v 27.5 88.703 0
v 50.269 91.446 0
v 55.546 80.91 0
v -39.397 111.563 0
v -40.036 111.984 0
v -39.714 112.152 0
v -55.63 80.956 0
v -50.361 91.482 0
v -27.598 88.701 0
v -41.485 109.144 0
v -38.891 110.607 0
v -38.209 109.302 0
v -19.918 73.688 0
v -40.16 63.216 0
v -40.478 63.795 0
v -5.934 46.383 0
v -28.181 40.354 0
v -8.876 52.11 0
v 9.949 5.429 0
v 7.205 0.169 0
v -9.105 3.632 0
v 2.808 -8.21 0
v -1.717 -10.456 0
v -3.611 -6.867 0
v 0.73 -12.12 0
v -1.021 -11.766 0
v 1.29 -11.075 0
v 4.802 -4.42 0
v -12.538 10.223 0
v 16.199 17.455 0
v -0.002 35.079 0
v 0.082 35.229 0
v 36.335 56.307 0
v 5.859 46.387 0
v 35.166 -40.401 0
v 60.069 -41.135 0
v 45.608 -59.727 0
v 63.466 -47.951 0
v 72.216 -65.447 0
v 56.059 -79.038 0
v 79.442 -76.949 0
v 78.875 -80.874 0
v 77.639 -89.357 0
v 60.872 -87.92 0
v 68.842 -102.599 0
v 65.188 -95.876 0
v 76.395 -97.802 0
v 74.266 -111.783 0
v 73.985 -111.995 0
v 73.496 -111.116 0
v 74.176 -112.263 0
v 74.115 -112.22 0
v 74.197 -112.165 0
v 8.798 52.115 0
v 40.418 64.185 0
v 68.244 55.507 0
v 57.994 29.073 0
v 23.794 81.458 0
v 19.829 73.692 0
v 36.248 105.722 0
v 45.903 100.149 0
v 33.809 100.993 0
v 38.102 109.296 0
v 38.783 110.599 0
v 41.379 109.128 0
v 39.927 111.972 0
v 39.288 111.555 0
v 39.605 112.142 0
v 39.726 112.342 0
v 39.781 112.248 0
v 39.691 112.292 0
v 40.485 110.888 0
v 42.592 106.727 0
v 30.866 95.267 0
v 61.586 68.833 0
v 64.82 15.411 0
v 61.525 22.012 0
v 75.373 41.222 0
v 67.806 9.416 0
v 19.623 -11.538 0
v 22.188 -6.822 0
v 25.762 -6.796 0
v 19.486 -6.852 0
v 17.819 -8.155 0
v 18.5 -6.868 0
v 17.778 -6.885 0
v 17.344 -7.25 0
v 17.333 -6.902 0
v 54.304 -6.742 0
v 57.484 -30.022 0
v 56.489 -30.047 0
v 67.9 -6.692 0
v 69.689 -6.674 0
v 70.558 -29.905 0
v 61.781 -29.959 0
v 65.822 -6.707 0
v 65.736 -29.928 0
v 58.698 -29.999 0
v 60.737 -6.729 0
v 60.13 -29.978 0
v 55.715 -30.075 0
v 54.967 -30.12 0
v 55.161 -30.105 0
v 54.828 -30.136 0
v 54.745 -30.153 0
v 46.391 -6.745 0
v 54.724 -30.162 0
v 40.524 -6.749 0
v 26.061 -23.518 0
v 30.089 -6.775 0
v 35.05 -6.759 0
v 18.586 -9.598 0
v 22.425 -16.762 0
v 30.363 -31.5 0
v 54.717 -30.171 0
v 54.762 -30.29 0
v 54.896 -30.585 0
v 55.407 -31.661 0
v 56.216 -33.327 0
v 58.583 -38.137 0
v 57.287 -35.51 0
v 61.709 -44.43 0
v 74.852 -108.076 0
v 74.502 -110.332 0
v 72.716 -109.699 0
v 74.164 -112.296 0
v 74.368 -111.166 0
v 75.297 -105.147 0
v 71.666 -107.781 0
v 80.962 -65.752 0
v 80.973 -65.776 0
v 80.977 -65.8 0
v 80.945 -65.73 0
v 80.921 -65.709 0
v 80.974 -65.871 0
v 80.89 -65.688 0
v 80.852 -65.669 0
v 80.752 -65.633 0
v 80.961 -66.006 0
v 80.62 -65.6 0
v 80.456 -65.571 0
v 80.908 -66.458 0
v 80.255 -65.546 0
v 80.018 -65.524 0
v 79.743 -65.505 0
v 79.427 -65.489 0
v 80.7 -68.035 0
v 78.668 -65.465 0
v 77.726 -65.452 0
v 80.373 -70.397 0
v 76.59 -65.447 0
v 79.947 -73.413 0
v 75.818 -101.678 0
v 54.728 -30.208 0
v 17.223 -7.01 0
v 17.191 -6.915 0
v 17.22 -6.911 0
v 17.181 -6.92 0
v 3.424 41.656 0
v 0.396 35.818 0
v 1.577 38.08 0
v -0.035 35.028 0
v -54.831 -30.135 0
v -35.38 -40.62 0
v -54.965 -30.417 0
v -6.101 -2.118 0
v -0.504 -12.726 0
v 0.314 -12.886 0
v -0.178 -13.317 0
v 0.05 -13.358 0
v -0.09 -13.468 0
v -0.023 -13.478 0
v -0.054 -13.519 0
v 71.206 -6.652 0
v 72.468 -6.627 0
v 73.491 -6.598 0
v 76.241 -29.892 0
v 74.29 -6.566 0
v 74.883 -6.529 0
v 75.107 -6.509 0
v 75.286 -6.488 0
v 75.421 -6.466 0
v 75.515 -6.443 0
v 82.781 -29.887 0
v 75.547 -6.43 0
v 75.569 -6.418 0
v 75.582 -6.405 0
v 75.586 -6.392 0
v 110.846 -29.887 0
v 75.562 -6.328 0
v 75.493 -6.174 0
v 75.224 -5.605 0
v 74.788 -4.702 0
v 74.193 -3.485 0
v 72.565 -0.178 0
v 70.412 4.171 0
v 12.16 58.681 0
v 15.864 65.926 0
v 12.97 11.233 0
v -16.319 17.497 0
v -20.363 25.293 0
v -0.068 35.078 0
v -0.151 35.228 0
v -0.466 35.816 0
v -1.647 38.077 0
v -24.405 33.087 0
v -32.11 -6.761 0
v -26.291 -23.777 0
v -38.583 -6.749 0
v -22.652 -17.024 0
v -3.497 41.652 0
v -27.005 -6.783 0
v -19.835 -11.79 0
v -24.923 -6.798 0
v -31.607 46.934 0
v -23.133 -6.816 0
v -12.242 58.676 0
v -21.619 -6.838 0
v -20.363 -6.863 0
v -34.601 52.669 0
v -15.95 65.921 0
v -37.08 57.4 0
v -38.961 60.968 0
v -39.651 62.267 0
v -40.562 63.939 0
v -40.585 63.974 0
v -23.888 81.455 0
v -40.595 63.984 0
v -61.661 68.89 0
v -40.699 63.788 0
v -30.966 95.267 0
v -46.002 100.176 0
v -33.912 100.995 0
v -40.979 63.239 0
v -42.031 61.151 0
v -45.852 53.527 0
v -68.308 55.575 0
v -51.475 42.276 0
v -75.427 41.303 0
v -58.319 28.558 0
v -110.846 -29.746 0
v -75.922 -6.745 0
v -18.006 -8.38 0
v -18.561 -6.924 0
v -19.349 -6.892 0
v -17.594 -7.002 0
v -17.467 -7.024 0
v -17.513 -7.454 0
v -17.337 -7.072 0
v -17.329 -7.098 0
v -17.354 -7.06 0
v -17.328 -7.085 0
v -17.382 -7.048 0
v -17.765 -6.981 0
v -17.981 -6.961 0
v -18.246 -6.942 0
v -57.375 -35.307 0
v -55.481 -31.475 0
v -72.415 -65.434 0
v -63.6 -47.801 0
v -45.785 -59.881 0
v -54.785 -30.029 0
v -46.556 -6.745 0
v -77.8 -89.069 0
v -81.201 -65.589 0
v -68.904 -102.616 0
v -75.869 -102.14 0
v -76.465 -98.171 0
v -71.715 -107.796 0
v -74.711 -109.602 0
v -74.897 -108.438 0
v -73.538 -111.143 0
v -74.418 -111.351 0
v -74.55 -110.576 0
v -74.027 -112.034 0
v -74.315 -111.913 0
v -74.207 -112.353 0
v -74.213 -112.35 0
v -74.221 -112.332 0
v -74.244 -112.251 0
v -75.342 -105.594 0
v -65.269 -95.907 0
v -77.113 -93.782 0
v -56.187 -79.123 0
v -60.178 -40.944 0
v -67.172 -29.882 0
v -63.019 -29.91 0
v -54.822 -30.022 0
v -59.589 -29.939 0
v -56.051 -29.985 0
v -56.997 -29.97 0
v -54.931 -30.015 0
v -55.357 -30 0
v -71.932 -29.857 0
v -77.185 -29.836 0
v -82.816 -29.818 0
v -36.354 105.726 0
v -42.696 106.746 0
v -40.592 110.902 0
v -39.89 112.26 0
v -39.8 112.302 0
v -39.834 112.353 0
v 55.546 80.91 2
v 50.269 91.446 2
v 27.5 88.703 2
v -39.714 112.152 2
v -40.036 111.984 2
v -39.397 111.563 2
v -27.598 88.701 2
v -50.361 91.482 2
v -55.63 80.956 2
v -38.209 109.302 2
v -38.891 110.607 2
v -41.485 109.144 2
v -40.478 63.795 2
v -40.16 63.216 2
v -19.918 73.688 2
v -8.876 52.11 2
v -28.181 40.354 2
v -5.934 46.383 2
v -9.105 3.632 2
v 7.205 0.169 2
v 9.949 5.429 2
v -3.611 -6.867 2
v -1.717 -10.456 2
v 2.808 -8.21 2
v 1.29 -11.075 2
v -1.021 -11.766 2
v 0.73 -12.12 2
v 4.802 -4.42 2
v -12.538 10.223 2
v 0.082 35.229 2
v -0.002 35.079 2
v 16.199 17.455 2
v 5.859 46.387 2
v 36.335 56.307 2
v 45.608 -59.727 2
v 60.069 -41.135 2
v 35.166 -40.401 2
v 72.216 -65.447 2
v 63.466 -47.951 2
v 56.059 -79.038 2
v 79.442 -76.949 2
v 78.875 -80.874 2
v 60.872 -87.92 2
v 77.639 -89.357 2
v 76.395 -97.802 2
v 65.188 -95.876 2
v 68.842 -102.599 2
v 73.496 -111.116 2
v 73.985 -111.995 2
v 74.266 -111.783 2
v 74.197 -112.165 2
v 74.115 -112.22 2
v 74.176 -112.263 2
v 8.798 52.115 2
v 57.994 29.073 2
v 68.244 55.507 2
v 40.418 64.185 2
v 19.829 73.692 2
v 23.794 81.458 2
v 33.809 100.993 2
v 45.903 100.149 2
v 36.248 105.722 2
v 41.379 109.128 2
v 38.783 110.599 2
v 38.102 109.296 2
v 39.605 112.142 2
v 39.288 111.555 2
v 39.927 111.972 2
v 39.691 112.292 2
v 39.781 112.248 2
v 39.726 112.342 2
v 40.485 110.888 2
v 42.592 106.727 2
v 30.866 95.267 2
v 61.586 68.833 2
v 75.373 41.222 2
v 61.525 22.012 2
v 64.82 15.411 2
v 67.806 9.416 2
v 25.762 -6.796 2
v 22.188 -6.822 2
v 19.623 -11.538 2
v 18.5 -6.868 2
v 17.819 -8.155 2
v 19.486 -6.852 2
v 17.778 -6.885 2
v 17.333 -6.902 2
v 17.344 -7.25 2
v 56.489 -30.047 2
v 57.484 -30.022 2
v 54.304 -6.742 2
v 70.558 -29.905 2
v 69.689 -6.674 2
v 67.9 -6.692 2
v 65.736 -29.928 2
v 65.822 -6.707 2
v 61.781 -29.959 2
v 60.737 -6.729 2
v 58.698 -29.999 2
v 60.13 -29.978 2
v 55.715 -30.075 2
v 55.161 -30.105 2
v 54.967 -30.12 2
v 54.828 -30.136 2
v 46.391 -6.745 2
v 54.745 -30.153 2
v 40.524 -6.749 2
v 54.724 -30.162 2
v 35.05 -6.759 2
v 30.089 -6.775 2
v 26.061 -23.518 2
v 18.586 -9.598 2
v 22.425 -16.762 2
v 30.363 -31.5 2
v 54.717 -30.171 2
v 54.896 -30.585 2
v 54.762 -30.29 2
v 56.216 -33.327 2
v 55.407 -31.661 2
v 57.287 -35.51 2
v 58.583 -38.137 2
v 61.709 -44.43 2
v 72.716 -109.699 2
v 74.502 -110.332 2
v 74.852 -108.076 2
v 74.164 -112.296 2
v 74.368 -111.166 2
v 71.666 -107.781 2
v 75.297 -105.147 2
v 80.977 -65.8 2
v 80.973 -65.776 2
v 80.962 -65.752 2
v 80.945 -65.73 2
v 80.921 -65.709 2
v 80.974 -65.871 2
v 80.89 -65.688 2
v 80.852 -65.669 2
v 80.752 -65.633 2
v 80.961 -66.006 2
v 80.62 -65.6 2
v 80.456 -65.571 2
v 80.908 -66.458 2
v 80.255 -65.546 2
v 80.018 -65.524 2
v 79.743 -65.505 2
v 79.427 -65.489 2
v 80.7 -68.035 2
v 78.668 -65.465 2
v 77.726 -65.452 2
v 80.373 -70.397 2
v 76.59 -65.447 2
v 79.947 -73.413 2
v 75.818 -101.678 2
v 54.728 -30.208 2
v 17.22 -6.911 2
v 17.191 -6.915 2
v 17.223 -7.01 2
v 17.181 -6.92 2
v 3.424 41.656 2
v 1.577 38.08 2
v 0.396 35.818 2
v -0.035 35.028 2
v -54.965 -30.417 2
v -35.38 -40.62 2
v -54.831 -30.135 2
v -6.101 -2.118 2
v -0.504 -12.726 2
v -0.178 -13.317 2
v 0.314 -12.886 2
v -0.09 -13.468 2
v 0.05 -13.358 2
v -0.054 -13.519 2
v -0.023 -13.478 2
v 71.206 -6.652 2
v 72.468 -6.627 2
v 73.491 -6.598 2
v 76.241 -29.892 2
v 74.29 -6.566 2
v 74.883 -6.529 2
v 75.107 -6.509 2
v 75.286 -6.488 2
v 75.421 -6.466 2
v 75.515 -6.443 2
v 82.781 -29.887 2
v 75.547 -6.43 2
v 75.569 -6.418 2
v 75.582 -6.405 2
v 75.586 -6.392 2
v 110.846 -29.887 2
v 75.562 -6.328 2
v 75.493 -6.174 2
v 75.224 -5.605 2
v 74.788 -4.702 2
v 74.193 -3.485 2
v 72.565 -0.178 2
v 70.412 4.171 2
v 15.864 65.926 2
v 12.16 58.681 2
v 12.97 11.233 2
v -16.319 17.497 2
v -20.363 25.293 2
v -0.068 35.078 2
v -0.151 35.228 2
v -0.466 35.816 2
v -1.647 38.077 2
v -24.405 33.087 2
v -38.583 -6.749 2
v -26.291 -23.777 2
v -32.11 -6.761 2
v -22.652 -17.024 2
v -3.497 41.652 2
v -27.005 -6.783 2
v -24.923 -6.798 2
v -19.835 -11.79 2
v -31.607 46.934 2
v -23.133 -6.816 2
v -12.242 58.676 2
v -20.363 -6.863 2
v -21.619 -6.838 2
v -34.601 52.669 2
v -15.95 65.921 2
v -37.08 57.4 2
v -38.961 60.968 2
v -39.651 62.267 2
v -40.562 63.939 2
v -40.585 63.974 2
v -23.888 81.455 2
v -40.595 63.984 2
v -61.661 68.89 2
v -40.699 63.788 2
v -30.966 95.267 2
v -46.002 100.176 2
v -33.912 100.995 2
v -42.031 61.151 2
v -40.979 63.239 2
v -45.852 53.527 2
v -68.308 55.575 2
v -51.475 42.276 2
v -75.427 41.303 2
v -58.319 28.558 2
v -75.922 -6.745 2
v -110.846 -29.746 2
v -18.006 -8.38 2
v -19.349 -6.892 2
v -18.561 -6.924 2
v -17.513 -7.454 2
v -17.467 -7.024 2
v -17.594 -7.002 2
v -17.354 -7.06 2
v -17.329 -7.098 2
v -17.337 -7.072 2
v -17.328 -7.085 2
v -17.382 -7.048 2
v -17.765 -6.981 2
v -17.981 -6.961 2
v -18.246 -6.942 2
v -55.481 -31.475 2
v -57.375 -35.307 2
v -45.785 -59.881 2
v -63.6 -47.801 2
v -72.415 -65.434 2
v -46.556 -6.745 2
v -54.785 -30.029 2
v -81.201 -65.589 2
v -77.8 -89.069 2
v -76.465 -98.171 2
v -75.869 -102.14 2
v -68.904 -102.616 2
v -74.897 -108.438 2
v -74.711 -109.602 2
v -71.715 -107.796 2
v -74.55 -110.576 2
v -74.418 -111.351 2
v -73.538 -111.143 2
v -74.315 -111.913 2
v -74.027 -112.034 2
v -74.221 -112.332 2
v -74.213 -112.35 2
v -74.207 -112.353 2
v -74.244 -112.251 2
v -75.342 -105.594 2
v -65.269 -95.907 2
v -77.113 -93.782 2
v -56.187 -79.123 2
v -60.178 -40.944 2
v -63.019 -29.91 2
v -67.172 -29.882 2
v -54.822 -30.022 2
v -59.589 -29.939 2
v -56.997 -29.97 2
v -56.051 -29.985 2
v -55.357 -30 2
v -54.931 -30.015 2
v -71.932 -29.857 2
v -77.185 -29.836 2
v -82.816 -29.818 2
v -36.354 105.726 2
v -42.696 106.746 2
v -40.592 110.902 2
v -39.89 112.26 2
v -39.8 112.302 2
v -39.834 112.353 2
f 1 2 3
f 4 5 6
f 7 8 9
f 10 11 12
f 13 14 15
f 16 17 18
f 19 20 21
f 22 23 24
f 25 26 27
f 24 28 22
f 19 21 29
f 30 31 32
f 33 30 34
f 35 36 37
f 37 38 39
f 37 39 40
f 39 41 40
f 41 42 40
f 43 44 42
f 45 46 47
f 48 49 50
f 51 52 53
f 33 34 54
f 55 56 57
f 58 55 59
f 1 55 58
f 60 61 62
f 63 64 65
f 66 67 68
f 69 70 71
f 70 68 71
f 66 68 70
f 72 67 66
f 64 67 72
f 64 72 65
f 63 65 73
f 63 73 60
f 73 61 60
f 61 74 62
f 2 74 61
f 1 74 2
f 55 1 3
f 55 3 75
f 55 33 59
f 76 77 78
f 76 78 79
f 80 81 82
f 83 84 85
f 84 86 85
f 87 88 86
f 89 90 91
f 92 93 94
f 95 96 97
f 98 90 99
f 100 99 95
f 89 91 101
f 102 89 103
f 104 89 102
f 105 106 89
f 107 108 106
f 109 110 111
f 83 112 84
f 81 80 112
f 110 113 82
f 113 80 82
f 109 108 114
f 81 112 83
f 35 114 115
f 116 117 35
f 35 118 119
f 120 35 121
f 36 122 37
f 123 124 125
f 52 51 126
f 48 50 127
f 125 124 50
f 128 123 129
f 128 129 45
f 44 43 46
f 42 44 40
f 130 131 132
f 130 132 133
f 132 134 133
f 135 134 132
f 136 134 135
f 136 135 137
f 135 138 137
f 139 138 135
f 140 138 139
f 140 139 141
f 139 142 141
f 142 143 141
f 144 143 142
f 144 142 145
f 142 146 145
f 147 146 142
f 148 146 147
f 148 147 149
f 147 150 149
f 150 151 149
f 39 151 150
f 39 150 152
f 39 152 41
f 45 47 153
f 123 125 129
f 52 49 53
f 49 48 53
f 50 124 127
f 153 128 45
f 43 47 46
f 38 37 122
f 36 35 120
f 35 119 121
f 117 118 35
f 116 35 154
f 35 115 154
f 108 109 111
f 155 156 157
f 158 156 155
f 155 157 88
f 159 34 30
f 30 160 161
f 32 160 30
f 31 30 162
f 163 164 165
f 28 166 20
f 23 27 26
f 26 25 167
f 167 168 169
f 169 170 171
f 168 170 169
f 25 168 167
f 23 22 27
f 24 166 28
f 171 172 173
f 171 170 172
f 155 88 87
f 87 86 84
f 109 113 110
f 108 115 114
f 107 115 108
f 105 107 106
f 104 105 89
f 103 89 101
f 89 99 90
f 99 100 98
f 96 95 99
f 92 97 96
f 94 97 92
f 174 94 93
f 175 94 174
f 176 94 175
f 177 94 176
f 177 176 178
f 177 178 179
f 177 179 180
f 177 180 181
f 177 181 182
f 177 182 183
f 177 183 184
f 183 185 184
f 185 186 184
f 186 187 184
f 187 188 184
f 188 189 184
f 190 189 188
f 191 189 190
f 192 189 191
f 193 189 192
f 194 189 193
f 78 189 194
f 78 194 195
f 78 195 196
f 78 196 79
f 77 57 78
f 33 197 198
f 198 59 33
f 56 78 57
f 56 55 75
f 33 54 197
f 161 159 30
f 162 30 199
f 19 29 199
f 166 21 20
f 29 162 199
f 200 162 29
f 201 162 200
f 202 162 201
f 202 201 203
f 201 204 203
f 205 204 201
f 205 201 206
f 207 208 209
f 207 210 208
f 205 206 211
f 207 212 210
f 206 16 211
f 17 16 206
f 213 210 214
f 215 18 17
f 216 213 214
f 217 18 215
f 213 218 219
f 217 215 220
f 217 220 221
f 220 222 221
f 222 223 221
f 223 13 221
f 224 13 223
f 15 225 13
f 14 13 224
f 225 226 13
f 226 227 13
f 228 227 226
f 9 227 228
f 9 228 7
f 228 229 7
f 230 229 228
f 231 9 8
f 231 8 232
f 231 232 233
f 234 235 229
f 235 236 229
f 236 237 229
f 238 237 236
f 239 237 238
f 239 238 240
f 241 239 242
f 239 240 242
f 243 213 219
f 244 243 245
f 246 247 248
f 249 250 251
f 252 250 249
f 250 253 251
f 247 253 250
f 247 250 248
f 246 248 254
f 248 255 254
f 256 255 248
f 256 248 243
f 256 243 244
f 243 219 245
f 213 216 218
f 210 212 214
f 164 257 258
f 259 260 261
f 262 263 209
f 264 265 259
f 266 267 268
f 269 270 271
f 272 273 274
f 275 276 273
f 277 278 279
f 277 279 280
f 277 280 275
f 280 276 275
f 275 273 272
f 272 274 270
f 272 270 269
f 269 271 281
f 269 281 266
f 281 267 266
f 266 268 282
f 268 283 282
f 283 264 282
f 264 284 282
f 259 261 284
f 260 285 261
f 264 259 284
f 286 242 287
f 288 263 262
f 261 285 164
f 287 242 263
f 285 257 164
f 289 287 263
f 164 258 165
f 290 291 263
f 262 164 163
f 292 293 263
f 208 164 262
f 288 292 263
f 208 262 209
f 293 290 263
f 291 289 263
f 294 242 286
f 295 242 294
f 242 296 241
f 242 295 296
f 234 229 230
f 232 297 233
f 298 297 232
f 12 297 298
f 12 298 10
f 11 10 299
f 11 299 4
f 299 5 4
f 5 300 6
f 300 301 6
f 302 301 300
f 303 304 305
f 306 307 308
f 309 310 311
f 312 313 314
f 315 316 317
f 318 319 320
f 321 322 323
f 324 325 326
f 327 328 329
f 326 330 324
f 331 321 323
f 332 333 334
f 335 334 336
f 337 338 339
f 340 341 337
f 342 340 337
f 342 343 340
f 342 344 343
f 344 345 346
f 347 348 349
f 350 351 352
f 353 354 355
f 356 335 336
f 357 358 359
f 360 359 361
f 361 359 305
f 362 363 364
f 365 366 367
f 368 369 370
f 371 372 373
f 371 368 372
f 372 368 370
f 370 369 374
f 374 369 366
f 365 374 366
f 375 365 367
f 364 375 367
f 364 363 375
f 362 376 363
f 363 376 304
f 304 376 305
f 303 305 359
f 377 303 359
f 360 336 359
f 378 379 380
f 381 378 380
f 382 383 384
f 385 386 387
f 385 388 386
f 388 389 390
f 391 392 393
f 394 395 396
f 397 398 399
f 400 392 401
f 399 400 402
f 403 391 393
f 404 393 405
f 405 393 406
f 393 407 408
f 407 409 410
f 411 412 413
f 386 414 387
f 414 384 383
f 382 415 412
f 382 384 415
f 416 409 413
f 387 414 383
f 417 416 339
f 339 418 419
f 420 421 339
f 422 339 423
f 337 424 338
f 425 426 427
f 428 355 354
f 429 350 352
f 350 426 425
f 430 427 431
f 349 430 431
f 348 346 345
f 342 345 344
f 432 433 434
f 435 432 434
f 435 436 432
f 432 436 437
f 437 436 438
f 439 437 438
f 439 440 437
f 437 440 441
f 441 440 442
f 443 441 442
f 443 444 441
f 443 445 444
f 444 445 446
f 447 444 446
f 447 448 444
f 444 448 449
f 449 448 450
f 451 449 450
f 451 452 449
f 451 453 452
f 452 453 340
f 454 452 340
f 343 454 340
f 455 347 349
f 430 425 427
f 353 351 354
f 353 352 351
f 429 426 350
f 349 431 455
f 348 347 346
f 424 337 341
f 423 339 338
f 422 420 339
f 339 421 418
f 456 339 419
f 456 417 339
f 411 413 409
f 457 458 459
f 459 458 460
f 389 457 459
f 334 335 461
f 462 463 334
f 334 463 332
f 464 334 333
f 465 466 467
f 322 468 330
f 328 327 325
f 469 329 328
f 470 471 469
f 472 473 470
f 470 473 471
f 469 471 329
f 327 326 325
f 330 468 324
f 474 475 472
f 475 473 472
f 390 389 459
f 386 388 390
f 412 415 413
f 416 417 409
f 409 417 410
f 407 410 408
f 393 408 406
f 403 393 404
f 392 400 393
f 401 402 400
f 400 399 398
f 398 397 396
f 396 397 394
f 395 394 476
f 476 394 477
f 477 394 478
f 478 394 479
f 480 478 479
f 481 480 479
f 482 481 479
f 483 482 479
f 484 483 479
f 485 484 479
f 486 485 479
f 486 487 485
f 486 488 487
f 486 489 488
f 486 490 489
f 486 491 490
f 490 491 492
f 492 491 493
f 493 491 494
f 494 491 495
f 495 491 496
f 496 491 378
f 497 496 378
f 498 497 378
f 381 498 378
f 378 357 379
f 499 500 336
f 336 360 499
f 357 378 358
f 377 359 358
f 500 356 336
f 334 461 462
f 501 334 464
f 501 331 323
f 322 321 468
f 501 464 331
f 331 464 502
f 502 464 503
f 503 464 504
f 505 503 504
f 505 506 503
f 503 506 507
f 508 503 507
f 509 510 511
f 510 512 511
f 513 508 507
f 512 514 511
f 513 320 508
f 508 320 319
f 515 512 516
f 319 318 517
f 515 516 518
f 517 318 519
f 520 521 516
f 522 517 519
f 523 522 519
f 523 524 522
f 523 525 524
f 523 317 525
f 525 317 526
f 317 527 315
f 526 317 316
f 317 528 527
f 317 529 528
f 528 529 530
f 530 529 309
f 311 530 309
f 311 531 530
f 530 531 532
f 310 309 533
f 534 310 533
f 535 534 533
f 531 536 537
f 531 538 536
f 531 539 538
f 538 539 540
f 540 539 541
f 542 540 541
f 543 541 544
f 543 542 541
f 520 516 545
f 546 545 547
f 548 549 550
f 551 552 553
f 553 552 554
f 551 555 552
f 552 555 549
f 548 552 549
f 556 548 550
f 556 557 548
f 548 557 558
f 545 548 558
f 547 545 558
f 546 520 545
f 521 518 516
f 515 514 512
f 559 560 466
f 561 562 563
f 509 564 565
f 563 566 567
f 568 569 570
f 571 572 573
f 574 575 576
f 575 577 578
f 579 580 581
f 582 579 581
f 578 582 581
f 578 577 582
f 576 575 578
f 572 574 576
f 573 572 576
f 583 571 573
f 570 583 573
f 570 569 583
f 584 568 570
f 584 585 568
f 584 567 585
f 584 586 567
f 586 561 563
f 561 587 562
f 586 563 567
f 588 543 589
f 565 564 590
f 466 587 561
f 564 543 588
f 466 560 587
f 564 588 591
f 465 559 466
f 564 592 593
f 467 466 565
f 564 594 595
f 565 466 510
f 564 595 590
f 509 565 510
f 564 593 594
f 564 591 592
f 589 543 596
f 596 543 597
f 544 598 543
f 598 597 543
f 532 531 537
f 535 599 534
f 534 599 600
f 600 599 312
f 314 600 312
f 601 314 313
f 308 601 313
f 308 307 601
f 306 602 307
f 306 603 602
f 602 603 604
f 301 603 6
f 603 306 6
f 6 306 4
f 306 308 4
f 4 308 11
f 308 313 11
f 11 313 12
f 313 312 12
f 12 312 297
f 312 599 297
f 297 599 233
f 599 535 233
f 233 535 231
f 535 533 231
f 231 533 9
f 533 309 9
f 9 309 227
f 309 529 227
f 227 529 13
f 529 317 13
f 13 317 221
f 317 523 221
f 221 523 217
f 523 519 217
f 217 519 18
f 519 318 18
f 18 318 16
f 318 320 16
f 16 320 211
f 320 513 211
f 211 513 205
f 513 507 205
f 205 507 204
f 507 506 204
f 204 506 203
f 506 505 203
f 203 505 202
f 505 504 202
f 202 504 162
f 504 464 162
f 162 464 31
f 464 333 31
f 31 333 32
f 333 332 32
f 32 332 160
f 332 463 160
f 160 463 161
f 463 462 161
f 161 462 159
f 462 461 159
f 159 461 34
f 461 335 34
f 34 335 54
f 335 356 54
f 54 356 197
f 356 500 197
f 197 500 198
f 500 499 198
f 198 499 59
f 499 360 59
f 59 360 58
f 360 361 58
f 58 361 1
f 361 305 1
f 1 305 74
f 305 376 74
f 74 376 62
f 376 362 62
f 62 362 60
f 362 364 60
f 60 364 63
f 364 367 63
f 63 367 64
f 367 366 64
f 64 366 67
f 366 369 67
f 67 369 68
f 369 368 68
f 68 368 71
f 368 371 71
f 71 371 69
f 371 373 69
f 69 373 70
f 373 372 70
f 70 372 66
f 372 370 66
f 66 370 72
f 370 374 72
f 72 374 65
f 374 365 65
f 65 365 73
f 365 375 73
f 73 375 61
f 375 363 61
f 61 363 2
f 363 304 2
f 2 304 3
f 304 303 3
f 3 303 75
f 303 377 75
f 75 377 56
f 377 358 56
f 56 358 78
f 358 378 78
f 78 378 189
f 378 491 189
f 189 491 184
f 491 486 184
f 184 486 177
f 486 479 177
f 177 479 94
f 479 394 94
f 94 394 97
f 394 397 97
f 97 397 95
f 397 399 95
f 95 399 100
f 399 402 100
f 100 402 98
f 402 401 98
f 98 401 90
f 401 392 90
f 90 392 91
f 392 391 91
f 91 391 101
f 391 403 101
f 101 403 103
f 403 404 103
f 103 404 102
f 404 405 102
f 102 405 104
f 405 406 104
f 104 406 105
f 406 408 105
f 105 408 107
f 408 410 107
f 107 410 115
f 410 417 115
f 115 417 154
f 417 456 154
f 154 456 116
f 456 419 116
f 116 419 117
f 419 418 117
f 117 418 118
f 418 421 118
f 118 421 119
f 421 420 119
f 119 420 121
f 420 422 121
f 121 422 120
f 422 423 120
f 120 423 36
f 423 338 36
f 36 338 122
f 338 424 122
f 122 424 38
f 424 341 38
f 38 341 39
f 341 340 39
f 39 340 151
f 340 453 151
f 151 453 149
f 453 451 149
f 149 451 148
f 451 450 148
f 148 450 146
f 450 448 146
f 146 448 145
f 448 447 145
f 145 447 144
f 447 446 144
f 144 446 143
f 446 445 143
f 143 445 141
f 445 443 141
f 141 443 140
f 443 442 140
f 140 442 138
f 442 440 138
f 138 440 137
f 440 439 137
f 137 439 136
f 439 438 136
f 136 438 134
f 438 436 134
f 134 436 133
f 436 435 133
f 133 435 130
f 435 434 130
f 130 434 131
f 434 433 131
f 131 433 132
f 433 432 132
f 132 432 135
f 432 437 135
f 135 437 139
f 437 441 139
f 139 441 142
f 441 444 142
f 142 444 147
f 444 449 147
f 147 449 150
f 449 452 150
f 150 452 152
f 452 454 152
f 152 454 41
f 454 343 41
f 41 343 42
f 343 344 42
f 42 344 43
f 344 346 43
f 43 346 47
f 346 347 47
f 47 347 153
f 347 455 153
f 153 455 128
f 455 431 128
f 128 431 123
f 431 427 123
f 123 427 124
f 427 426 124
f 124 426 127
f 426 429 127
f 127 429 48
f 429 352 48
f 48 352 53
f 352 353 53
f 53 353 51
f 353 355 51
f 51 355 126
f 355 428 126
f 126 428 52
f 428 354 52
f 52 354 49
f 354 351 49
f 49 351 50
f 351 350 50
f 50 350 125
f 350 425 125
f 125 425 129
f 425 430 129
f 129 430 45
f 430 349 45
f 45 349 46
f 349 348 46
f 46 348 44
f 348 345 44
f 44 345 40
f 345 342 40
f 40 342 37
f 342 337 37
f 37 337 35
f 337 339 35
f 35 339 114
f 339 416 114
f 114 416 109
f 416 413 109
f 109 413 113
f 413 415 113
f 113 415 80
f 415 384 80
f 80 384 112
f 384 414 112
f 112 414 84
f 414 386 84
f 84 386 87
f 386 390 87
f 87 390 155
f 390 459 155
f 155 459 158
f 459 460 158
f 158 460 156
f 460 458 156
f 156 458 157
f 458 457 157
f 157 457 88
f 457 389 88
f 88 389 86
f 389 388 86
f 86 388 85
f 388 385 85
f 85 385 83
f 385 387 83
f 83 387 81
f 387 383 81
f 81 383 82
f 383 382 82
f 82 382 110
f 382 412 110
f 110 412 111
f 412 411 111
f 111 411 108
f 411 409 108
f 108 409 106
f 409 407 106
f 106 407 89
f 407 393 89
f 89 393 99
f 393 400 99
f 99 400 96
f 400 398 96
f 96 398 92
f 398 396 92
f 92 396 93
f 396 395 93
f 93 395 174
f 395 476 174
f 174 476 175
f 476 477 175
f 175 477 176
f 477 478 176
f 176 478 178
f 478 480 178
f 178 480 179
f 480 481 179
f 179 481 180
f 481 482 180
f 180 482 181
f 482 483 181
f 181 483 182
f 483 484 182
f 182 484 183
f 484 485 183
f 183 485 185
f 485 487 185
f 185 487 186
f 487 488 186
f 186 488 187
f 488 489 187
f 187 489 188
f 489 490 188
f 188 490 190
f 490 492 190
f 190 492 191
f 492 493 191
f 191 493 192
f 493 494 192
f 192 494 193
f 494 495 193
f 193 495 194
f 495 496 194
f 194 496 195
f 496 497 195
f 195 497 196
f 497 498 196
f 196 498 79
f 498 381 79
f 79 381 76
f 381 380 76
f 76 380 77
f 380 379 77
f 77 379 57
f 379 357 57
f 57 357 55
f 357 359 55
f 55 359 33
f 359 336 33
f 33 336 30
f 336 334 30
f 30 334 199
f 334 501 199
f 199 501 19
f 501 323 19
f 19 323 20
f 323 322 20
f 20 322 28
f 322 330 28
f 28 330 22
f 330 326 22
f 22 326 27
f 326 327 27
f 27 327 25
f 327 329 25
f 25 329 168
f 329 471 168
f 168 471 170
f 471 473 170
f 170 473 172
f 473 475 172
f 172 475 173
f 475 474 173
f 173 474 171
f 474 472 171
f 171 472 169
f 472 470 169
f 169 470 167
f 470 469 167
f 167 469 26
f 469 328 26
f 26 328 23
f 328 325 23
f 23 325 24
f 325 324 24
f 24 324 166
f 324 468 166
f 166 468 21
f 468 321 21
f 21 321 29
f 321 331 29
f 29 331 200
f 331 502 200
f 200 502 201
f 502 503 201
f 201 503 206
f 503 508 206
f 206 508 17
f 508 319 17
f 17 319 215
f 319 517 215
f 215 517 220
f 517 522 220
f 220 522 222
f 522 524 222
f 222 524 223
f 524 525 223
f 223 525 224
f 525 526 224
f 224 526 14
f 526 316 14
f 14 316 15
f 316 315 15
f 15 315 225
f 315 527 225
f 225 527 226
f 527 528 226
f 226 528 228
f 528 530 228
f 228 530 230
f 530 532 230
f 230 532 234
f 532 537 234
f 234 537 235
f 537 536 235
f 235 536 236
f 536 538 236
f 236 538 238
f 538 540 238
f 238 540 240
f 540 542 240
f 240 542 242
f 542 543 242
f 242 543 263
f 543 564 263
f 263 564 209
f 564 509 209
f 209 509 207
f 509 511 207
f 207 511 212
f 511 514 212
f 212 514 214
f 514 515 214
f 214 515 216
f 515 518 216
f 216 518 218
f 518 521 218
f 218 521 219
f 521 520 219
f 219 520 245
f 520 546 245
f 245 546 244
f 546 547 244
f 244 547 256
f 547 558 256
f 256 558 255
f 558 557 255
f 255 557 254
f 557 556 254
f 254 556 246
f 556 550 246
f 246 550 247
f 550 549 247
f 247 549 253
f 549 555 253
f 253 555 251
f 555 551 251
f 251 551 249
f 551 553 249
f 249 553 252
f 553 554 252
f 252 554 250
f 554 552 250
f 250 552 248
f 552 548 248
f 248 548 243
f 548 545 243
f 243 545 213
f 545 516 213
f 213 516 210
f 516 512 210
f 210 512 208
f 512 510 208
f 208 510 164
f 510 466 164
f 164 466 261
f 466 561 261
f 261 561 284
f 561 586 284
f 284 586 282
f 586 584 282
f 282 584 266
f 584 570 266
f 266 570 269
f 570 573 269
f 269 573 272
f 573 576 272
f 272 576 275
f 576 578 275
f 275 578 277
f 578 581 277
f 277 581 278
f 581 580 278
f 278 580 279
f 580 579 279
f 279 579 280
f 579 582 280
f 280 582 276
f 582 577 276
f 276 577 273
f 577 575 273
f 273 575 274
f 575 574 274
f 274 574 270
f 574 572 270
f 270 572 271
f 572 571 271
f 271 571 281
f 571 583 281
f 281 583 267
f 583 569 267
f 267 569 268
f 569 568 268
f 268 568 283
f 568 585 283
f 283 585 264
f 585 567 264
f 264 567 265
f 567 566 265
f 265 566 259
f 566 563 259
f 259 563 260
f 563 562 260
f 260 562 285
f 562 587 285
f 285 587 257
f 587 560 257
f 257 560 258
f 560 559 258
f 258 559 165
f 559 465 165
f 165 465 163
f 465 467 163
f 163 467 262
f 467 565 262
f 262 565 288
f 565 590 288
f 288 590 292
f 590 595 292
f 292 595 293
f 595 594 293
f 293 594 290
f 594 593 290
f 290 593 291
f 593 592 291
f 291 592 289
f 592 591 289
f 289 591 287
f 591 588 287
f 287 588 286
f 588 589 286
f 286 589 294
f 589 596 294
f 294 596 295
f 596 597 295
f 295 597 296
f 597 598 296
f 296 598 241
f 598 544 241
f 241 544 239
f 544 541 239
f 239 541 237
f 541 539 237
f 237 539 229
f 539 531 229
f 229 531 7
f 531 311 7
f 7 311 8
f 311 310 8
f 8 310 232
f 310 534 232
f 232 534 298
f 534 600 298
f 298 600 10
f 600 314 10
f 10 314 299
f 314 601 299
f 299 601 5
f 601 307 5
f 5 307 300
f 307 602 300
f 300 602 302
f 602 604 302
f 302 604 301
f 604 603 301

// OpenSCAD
// Module names are of the form poly_<inkscape-path-id>().
// As a result you can associate a polygon in this OpenSCAD program with the
//  corresponding SVG element in the Inkscape document by looking for 
//  the XML element with the attribute id="inkscape-path-id".

// Paths have their own variables so they can be imported and used 
//  in polygon(points) structures in other programs.
// The NN_points is the list of all polygon XY vertices. 
// There may be an NN_paths variable as well. If it exists then it 
//  defines the nested paths. Both must be used in the 
//  polygon(points, paths) variant of the command.

profile_scale = 25.4/90; //made in inkscape in mm

// helper functions to determine the X,Y dimensions of the profiles
function min_x(shape_points) = min([ for (x = shape_points) min(x[0])]);
function max_x(shape_points) = max([ for (x = shape_points) max(x[0])]);
function min_y(shape_points) = min([ for (x = shape_points) min(x[1])]);
function max_y(shape_points) = max([ for (x = shape_points) max(x[1])]);

height = 2;
width = 1.0;


path4506_0_points = [[-275.670758,315.599620],[-287.720498,232.400380],[-272.155208,232.126730],[-256.589928,231.853090],[-225.355478,169.374620],[-213.227725,145.076501],[-203.296146,125.104371],[-196.585620,111.524486],[-194.758527,107.777340],[-194.283071,106.777464],[-194.121028,106.403100],[-194.250906,106.377493],[-194.636297,106.351552],[-196.148160,106.298855],[-198.605694,106.245392],[-201.957979,106.191548],[-211.143118,106.084248],[-223.296211,105.980023],[-238.009892,105.881938],[-254.876795,105.793063],[-273.489552,105.716465],[-293.440798,105.655210],[-392.760573,105.400380],[-267.260418,-146.349620],[-242.037533,-196.920885],[-218.482534,-244.099425],[-197.112692,-286.852672],[-178.445275,-324.148057],[-162.997553,-354.953014],[-151.286794,-378.234972],[-146.994423,-386.732149],[-143.830270,-392.961363],[-141.858991,-396.793544],[-141.340886,-397.770412],[-141.145248,-398.099620],[-141.022246,-397.920468],[-140.719682,-397.388866],[-139.593952,-395.303429],[-137.804237,-391.913548],[-135.386718,-387.289464],[-128.812987,-374.619640],[-120.162198,-357.855870],[-109.723788,-337.560069],[-97.787199,-314.294151],[-84.641869,-288.620030],[-70.577238,-261.099620],[-56.514921,-233.579519],[-43.376226,-207.906285],[-31.450126,-184.641769],[-21.025595,-164.347824],[-12.391608,-147.586301],[-5.837138,-134.919053],[-1.651160,-126.907932],[-0.536660,-124.823998],[-0.239835,-124.293164],[-0.122648,-124.114790],[-0.005553,-124.294669],[0.290993,-124.826954],[1.404400,-126.913620],[5.586171,-134.929494],[12.133988,-147.600485],[20.759171,-164.364667],[31.173042,-184.660115],[43.086922,-207.924902],[56.212132,-233.597102],[70.259992,-261.114790],[84.310249,-288.631382],[97.442323,-314.300454],[109.367056,-337.560308],[119.795287,-357.849247],[128.437857,-374.605573],[135.005604,-387.267590],[137.421057,-391.887702],[139.209370,-395.273600],[140.334396,-397.355072],[140.636882,-397.884707],[140.759993,-398.061906],[140.956084,-397.730487],[141.475129,-396.750887],[143.449702,-392.911741],[146.618952,-386.673667],[150.918121,-378.165864],[162.647183,-354.857869],[178.118820,-324.021349],[196.814965,-286.689900],[218.217550,-243.897114],[241.808509,-196.676586],[267.069773,-146.061910],[392.760573,105.900380],[293.319772,105.900380],[270.144509,105.916244],[250.007167,105.963726],[232.923811,106.042666],[218.910501,106.152901],[213.060133,106.219704],[207.983301,106.294269],[203.682010,106.376577],[200.158271,106.466608],[197.414089,106.564341],[195.451474,106.669756],[194.763881,106.725337],[194.272433,106.782832],[193.977379,106.842237],[193.903579,106.872655],[193.878972,106.903550],[193.919513,107.036044],[194.039808,107.327381],[194.511720,108.370433],[196.325191,112.185003],[199.192232,118.088863],[202.985687,125.823613],[207.578403,135.130855],[212.843224,145.752191],[218.652995,157.429222],[224.880562,169.903550],[255.882142,231.900380],[271.380562,231.900380],[275.408122,231.915365],[278.743257,231.962919],[281.434427,232.046937],[282.553669,232.103838],[283.530094,232.171316],[284.369758,232.249859],[285.078719,232.339954],[285.663034,232.442087],[286.128763,232.556746],[286.481961,232.684417],[286.618254,232.753285],[286.728687,232.825589],[286.814016,232.901389],[286.874998,232.980747],[286.912391,233.063724],[286.926952,233.150380],[286.914933,233.402346],[286.869087,233.879752],[286.680221,235.481519],[285.943911,241.067319],[284.786871,249.437945],[283.277949,260.123560],[281.485995,272.654327],[279.479856,286.560411],[275.100420,316.619183],[270.690430,346.541185],[268.646098,360.276308],[266.800674,372.567729],[265.223006,382.945613],[263.981942,390.940124],[263.509152,393.896790],[263.146332,396.081425],[262.902086,397.435298],[262.827119,397.782346],[262.785022,397.899680],[262.611127,397.629898],[262.152449,396.831827],[260.417548,393.718882],[257.653928,388.696964],[253.935194,381.902194],[243.926815,363.538578],[230.981267,339.716995],[215.687406,311.526405],[198.634088,280.055769],[161.604500,211.630201],[124.603349,143.151979],[107.585577,111.615523],[92.341481,83.332787],[79.459917,59.392729],[69.529741,40.884312],[65.855440,34.007268],[63.139807,28.896495],[61.456449,25.688112],[61.024875,24.839855],[60.878972,24.518240],[60.912947,24.502357],[61.014317,24.486569],[61.415929,24.455301],[62.991424,24.394126],[65.552392,24.335033],[69.045769,24.278338],[78.617498,24.173410],[91.282098,24.081878],[106.615056,24.006274],[124.191863,23.949133],[143.588006,23.912991],[164.378972,23.900380],[192.415365,23.887369],[215.210803,23.844610],[233.227794,23.766514],[240.588905,23.712468],[246.928844,23.647492],[252.305424,23.570888],[256.776460,23.481957],[260.399763,23.380000],[263.233149,23.264319],[265.334429,23.134215],[266.128596,23.063536],[266.761417,22.988990],[267.240119,22.910488],[267.571927,22.827944],[267.685005,22.785129],[267.764070,22.741271],[267.810024,22.696358],[267.823772,22.650380],[267.739501,22.423614],[267.495049,21.877590],[266.541582,19.859982],[264.995330,16.661985],[262.888250,12.348025],[257.119436,0.629925],[249.490799,-14.778901],[240.257999,-33.363037],[229.676695,-54.607064],[218.002546,-77.995568],[205.491212,-103.013130],[143.213852,-227.426640],[128.747632,-199.513130],[57.396722,-61.849620],[45.955455,-39.803160],[35.254052,-19.235753],[25.528710,-0.597545],[17.015625,15.661317],[9.950993,29.090688],[4.571012,39.240419],[2.586576,42.944750],[1.111876,45.660365],[0.176437,47.330998],[-0.079834,47.756862],[-0.190218,47.900380],[-0.319397,47.720545],[-0.631442,47.186915],[-1.785681,45.093523],[-3.616038,41.690713],[-6.085622,37.048991],[-12.794892,24.330841],[-21.618337,7.503131],[-32.260809,-12.870081],[-44.427155,-36.224739],[-57.822225,-61.996785],[-72.150868,-89.622160],[-86.473974,-117.238742],[-99.853177,-142.985578],[-111.994438,-166.300378],[-122.603719,-186.620854],[-131.386981,-203.384714],[-138.050185,-216.029670],[-140.494879,-220.631843],[-142.299294,-223.993432],[-143.426675,-226.044150],[-143.724992,-226.555967],[-143.805797,-226.679647],[-143.840268,-226.713710],[-144.207757,-226.020833],[-145.199866,-224.073996],[-148.929147,-216.675861],[-162.466398,-189.663681],[-182.391301,-149.795881],[-206.643138,-101.191170],[-269.015008,23.900380],[-164.961028,23.900380],[-136.710852,23.913274],[-113.776273,23.955748],[-95.685956,24.033492],[-88.310102,24.087368],[-81.968563,24.152195],[-76.602420,24.228684],[-72.152757,24.317546],[-68.560658,24.419492],[-65.767204,24.535234],[-64.651558,24.598501],[-63.713479,24.665483],[-62.945604,24.736269],[-62.340566,24.810949],[-61.891003,24.889611],[-61.589548,24.972345],[-61.492060,25.015266],[-61.428838,25.059238],[-61.398960,25.104272],[-61.401508,25.150380],[-62.054107,26.411526],[-63.800289,29.692932],[-70.281653,41.776641],[-80.262109,60.321740],[-93.158168,84.248459],[-125.363130,143.927682],[-162.228620,212.176160],[-199.086716,280.355743],[-231.269496,339.828281],[-244.148918,363.599986],[-254.109040,381.955624],[-260.566374,393.815424],[-262.299154,396.971958],[-262.937428,398.099620],[-262.958956,398.090284],[-262.988225,398.026664],[-263.069578,397.739213],[-263.320685,396.541972],[-263.684221,394.550196],[-264.153656,391.806181],[-264.722463,388.352224],[-265.384112,384.230624],[-266.959829,374.153680],[-268.828578,361.913729],[-270.938134,347.849149],[-273.236269,332.298320],[-275.670758,315.599620],[-275.670758,315.599620]];

module logo_no_skull(h, w, res=4)  {
  scale([profile_scale, -profile_scale, 1])
  union()  {
    linear_extrude(height=h)
      polygon(path4506_0_points);
  }
}

// The shapes
logo_no_skull(height, width);
